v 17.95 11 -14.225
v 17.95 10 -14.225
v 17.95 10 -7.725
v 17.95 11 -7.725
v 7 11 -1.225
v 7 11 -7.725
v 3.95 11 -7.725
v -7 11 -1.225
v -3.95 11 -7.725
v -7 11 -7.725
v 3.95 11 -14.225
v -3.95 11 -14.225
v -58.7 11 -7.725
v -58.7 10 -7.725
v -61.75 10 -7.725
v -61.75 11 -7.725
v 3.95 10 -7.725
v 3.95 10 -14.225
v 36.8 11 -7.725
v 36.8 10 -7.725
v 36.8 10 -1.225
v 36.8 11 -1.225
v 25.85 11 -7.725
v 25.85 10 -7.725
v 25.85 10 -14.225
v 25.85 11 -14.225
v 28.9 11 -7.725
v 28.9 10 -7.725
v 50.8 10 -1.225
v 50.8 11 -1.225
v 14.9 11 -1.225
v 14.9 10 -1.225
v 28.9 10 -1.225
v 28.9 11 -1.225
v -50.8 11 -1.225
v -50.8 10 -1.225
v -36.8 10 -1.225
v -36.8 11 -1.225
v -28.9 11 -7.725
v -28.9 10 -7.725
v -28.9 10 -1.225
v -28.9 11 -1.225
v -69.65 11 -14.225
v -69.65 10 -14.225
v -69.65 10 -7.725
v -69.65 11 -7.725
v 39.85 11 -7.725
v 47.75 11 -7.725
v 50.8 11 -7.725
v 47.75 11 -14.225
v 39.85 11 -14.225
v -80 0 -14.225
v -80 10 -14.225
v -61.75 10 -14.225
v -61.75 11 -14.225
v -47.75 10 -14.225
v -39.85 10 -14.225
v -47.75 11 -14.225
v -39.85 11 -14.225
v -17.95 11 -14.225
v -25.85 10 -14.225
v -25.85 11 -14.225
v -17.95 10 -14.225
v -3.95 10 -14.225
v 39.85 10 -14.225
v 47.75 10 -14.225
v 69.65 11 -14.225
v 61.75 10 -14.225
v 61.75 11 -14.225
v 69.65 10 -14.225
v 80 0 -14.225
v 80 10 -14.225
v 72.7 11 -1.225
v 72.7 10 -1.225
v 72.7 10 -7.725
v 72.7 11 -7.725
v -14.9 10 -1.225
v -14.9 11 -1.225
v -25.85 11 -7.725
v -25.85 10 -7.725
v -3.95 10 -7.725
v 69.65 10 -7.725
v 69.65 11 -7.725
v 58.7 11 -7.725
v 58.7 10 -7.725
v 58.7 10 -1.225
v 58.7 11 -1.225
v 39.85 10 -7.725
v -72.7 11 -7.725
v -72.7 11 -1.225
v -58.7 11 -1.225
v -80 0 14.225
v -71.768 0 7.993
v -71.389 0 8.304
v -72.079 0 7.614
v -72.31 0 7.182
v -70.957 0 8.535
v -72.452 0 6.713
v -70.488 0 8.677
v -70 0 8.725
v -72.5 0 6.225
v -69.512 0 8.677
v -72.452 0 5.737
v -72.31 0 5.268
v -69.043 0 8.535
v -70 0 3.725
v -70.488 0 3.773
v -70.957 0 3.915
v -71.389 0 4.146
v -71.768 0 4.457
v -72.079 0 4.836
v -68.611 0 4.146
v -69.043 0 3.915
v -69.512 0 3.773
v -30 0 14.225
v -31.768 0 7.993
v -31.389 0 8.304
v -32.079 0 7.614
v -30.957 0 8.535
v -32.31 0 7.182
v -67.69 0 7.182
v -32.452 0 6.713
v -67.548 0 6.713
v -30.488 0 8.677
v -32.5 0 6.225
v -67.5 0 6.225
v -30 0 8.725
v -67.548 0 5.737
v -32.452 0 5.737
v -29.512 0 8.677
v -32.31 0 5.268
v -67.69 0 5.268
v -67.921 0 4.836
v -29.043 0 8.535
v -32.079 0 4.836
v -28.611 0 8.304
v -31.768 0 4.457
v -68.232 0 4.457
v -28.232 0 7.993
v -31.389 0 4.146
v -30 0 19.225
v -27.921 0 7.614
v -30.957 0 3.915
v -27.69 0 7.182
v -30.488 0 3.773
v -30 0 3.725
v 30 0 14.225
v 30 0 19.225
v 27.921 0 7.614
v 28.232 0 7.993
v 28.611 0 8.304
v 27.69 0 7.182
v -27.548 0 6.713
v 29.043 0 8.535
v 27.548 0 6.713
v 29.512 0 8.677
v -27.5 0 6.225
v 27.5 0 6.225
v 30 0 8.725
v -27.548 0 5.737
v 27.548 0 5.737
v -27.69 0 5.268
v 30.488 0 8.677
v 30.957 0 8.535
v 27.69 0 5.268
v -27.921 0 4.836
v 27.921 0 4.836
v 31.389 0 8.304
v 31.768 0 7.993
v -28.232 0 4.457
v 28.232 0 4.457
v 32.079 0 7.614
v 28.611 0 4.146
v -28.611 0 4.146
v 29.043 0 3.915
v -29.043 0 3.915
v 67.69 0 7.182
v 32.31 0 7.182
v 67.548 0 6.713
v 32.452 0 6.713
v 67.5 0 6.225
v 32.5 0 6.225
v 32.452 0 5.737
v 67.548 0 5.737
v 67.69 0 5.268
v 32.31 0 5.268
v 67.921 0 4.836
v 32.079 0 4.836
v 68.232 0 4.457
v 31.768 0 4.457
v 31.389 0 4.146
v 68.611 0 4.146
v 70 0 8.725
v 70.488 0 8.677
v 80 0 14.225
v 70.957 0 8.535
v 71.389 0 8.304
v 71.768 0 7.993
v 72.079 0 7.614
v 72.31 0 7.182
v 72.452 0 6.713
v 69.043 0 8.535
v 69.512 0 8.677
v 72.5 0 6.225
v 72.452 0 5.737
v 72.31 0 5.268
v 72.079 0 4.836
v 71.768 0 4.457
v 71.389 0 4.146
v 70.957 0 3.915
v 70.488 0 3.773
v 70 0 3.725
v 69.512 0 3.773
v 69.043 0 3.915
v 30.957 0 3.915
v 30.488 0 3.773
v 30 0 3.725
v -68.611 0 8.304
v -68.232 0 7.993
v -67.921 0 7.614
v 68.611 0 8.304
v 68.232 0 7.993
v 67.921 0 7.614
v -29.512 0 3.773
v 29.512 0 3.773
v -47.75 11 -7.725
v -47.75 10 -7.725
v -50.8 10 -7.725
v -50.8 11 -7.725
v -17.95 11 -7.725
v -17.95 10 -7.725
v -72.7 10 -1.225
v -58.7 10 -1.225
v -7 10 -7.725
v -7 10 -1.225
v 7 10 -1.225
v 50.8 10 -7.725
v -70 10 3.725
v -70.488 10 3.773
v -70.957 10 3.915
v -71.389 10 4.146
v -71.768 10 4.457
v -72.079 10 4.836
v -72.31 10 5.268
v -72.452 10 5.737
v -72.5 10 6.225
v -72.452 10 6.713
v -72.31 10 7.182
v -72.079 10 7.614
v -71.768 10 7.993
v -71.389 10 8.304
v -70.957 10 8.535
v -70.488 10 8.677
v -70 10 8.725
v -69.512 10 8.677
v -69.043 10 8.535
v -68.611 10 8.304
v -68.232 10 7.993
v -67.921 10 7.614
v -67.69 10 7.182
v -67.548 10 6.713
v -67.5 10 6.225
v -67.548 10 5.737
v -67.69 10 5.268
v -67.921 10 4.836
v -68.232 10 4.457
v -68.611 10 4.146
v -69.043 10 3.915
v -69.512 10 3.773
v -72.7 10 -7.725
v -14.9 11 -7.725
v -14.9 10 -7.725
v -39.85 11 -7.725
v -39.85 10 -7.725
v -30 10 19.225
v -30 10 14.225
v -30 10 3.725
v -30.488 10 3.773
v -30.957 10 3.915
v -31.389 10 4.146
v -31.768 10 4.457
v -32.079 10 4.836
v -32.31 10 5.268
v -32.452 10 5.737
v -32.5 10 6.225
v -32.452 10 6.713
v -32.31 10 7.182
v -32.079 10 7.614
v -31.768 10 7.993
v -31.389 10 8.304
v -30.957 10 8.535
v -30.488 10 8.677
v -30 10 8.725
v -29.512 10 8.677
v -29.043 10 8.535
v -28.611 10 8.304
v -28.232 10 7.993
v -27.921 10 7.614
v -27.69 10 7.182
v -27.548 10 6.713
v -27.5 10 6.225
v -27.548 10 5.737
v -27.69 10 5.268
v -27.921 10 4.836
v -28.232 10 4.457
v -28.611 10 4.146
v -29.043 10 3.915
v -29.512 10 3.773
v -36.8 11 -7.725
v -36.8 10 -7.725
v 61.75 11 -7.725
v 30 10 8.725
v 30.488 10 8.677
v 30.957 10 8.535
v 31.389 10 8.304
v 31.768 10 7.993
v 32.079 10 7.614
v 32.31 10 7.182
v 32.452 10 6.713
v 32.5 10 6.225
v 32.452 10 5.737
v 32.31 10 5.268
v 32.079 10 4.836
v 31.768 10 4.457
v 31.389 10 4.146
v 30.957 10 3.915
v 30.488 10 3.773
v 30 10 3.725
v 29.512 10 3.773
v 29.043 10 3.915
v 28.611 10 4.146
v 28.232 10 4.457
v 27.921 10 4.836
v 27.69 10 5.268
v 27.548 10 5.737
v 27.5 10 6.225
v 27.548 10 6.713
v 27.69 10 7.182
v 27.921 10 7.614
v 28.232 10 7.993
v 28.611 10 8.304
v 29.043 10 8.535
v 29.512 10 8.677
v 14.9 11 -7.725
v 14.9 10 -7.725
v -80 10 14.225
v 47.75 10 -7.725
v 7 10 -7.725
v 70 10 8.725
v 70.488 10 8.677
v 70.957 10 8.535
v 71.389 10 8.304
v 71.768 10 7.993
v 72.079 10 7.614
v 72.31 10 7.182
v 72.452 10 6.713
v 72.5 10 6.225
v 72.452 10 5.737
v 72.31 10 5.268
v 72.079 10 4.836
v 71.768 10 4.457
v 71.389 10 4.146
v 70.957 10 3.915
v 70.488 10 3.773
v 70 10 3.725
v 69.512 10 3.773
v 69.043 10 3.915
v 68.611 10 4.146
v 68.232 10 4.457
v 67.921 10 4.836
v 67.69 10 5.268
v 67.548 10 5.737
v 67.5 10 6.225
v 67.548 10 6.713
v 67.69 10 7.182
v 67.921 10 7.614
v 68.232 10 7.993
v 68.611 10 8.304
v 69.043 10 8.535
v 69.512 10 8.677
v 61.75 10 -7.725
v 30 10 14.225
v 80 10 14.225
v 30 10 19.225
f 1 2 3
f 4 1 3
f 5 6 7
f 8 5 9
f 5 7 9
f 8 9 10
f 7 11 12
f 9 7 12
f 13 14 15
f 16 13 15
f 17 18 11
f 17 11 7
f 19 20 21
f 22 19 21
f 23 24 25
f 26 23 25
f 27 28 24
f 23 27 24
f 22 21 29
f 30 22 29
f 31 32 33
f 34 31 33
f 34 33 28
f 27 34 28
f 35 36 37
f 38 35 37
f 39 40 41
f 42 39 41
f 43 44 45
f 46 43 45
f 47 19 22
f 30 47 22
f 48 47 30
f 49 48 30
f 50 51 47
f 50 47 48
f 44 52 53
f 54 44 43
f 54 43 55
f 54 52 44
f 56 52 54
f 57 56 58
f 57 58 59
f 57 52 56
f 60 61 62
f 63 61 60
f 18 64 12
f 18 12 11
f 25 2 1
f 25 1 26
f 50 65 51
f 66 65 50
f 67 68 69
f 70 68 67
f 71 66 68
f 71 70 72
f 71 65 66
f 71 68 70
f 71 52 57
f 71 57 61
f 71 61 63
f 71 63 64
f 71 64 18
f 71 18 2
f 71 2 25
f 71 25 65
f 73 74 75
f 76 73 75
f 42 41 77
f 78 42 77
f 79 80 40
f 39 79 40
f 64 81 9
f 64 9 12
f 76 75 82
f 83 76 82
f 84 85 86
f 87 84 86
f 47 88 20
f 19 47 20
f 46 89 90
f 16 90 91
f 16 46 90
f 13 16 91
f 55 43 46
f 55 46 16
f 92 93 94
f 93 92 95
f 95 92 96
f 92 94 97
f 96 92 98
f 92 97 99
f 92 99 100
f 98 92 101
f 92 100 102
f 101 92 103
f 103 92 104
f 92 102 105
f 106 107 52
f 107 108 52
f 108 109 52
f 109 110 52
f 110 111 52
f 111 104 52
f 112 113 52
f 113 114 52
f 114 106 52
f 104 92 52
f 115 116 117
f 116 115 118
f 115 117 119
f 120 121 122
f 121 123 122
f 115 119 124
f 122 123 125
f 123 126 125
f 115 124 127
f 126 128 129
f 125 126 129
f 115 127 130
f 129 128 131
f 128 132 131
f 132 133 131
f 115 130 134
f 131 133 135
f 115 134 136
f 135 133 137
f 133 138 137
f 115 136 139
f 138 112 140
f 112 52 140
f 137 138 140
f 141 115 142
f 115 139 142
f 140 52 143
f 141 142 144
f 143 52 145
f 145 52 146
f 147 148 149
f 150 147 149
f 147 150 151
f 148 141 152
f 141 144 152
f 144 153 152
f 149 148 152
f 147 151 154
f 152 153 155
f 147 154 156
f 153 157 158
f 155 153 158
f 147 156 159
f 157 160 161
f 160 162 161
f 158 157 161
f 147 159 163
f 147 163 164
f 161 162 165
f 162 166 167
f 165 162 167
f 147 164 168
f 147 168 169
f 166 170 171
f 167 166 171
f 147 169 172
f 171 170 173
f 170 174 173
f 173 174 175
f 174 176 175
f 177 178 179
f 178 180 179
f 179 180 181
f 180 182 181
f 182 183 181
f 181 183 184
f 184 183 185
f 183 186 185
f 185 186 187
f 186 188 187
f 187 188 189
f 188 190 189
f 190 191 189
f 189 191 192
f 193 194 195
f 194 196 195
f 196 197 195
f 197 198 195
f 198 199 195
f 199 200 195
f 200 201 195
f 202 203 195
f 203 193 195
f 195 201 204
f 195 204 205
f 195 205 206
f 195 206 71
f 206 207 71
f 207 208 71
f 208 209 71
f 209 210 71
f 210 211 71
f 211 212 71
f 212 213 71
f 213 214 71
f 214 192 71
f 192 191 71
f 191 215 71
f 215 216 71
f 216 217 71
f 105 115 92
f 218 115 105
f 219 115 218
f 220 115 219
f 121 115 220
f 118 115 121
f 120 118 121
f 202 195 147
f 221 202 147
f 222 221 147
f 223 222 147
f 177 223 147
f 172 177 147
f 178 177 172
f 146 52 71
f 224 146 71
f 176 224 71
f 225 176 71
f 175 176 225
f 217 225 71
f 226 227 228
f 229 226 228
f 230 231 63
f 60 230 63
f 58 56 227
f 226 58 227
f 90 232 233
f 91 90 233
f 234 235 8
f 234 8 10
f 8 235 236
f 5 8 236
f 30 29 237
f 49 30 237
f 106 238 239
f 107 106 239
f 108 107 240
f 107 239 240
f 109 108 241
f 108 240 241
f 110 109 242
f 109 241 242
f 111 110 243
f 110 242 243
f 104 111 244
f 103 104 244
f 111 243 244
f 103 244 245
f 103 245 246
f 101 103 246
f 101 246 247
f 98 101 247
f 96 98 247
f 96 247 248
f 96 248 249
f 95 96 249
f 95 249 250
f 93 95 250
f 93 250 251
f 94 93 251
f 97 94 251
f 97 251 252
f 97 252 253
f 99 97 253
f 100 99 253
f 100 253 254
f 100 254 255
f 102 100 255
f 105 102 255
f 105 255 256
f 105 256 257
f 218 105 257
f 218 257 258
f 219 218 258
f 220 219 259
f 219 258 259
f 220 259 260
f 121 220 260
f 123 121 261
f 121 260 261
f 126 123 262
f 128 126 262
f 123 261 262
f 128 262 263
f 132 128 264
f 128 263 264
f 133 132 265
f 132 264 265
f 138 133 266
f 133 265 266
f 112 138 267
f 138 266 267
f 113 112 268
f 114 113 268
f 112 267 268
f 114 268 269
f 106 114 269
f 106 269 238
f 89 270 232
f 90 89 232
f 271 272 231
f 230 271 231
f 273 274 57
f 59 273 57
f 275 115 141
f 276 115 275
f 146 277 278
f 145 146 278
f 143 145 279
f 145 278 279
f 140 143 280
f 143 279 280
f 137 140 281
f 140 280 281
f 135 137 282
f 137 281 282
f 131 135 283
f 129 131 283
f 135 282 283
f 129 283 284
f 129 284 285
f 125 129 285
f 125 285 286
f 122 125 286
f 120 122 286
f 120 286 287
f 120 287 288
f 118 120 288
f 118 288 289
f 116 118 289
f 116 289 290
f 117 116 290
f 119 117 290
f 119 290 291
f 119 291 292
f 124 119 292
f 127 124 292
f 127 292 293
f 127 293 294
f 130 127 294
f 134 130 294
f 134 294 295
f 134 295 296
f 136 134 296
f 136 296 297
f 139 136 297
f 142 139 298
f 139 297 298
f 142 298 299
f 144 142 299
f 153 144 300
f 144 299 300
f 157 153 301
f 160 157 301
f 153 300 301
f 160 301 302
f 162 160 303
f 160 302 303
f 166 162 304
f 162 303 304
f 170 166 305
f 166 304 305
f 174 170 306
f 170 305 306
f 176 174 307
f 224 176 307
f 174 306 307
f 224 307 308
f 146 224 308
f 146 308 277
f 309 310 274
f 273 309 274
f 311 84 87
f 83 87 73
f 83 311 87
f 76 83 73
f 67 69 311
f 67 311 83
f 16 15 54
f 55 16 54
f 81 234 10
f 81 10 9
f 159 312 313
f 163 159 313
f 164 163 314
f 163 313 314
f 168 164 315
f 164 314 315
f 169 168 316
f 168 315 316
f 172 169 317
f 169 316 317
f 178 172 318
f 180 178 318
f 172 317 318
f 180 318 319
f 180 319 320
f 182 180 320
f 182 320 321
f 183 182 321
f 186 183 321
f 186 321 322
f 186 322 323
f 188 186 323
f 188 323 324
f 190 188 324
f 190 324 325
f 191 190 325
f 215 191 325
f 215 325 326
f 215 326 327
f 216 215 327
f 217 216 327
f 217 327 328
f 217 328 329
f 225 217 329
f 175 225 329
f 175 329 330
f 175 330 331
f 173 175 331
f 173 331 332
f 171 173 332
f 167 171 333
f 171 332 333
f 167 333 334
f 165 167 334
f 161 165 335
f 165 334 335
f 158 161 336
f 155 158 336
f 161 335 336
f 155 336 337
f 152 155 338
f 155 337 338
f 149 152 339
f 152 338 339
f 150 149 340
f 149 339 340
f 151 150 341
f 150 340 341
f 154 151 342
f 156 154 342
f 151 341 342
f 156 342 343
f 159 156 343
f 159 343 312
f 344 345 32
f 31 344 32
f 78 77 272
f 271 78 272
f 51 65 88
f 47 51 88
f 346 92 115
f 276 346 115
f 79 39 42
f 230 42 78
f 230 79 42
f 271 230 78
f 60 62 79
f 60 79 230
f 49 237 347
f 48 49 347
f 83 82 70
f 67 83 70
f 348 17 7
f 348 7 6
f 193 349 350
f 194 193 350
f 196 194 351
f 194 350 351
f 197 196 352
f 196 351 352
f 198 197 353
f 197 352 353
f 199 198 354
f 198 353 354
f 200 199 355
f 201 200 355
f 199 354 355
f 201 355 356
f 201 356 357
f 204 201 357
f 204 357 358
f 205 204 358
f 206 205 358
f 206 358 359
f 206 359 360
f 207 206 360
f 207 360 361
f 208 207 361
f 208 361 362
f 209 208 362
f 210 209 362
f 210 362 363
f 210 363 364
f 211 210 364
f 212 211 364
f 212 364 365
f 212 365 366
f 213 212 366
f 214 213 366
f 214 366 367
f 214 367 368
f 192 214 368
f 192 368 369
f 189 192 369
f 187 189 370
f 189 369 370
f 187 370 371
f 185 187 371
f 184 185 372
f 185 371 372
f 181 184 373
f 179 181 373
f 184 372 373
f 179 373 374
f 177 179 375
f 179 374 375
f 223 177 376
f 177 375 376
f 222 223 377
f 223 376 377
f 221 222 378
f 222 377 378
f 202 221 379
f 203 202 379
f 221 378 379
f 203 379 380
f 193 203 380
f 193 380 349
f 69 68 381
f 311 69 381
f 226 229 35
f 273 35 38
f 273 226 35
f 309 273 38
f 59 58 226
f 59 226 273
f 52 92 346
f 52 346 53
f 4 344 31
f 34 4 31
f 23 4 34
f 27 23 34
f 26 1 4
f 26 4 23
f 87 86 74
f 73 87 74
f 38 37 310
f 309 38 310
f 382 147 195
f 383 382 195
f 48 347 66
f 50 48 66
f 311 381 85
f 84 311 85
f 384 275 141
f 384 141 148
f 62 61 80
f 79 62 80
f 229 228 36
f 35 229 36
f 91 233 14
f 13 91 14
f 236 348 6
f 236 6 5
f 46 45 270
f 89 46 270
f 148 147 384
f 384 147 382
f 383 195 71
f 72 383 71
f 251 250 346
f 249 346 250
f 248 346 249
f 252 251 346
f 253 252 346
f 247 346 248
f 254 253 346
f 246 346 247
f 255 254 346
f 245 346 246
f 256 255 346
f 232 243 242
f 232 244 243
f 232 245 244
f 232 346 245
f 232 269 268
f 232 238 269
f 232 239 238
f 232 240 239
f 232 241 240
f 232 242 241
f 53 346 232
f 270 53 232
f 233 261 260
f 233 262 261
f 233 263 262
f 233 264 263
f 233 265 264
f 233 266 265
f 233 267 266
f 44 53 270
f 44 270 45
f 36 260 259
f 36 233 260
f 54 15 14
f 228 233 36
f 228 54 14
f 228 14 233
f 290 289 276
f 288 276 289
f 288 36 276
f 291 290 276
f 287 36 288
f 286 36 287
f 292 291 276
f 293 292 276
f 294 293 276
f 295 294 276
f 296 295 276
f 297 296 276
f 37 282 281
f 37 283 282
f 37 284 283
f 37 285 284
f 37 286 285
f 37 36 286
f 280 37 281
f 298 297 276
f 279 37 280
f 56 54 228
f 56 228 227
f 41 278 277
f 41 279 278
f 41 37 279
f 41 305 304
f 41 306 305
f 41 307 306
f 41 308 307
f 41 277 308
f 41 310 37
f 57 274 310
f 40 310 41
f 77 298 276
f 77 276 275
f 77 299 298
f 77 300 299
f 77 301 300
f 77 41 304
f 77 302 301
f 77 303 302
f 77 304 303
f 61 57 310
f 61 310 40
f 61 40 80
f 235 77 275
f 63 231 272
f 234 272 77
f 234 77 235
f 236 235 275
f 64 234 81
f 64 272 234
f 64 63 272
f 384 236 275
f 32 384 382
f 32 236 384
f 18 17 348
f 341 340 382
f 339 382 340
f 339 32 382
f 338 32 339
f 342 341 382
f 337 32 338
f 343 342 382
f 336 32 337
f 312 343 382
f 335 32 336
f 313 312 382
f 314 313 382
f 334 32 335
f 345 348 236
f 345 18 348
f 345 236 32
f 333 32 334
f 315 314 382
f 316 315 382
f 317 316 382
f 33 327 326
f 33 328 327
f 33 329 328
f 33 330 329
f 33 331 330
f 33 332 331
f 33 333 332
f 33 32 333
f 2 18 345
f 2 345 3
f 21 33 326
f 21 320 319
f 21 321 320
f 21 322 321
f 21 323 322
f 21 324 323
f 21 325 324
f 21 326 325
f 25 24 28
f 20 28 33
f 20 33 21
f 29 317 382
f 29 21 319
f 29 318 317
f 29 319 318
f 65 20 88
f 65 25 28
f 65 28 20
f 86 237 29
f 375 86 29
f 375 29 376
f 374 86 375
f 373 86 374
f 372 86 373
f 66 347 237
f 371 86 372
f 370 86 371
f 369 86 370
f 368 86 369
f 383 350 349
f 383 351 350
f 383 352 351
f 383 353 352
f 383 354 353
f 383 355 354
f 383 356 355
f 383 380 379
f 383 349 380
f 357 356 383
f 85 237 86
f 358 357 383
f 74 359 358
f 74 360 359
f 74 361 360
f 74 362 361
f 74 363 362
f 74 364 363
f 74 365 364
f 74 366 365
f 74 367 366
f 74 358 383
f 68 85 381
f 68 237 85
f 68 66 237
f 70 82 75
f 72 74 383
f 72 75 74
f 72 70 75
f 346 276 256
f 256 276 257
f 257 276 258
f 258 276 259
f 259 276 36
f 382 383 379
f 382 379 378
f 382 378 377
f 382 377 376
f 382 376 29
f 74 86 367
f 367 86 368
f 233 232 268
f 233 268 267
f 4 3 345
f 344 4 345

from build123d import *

# Parameters (mm, degrees)
SKETCH2_W           = 160
SKETCH2_H           = 28.45
BOSS_EXTRUDE1_DEPTH = 10
SKETCH4_W           = 60
SKETCH4_H           = 10
BOSS_EXTRUDE2_DEPTH = 5
SKETCH5_R           = 2.5
CUT_EXTRUDE1_DEPTH  = 83.883053907
BOSS_EXTRUDE3_DEPTH = 1


with BuildPart() as part:
    # Sketch2 → Boss-Extrude1 (new body)
    with BuildSketch(Plane(origin=(0, 0, 0), x_dir=(1, 0, 0), z_dir=(0, 1, 0))):
        Rectangle(SKETCH2_W, SKETCH2_H)
    extrude(amount=BOSS_EXTRUDE1_DEPTH)

    # Sketch4 → Boss-Extrude2 (add)
    with BuildSketch(Plane.XY.offset(14.225)):
        with Locations((0, 5)):
            Rectangle(SKETCH4_W, SKETCH4_H)
    extrude(amount=BOSS_EXTRUDE2_DEPTH)

    # Sketch5 → Cut-Extrude1 (cut, through all)
    with BuildSketch(Plane(origin=(0, 10, 0), x_dir=(1, 0, 0), z_dir=(0, 1, 0))):
        with Locations(Location((70, -6.225, 0), (0, 0, 270))):
            Circle(SKETCH5_R)
        with Locations(Location((30, -6.225, 0), (0, 0, 270))):
            Circle(SKETCH5_R)
        with Locations(Location((-30, -6.225, 0), (0, 0, 90))):
            Circle(SKETCH5_R)
        with Locations(Location((-70, -6.225, 0), (0, 0, 90))):
            Circle(SKETCH5_R)
    extrude(amount=-CUT_EXTRUDE1_DEPTH, mode=Mode.SUBTRACT)

    # Sketch6 → Boss-Extrude3 (add)
    with BuildSketch(Plane(origin=(0, 10, 0), x_dir=(1, 0, 0), z_dir=(0, 1, 0))):
        Polygon((3.95, 14.225), (3.95, 7.725), (7, 7.725), (7, 1.225), (0, 1.225), (-7, 1.225), (-7, 7.725), (-3.95, 7.725), (-3.95, 14.225), align=None)
        Polygon((-17.95, 14.225), (-25.85, 14.225), (-25.85, 7.725), (-28.9, 7.725), (-28.9, 1.225), (-21.9, 1.225), (-14.9, 1.225), (-14.9, 7.725), (-17.95, 7.725), align=None)
        Polygon((-39.85, 14.225), (-47.75, 14.225), (-47.75, 7.725), (-50.8, 7.725), (-50.8, 1.225), (-43.8, 1.225), (-36.8, 1.225), (-36.8, 7.725), (-39.85, 7.725), align=None)
        Polygon((-61.75, 14.225), (-69.65, 14.225), (-69.65, 7.725), (-72.7, 7.725), (-72.7, 1.225), (-65.7, 1.225), (-58.7, 1.225), (-58.7, 7.725), (-61.75, 7.725), align=None)
        Polygon((25.85, 14.225), (17.95, 14.225), (17.95, 7.725), (14.9, 7.725), (14.9, 1.225), (21.9, 1.225), (28.9, 1.225), (28.9, 7.725), (25.85, 7.725), align=None)
        Polygon((47.75, 14.225), (39.85, 14.225), (39.85, 7.725), (36.8, 7.725), (36.8, 1.225), (43.8, 1.225), (50.8, 1.225), (50.8, 7.725), (47.75, 7.725), align=None)
        Polygon((69.65, 14.225), (61.75, 14.225), (61.75, 7.725), (58.7, 7.725), (58.7, 1.225), (65.7, 1.225), (72.7, 1.225), (72.7, 7.725), (69.65, 7.725), align=None)
    extrude(amount=BOSS_EXTRUDE3_DEPTH)


solid = part.part
